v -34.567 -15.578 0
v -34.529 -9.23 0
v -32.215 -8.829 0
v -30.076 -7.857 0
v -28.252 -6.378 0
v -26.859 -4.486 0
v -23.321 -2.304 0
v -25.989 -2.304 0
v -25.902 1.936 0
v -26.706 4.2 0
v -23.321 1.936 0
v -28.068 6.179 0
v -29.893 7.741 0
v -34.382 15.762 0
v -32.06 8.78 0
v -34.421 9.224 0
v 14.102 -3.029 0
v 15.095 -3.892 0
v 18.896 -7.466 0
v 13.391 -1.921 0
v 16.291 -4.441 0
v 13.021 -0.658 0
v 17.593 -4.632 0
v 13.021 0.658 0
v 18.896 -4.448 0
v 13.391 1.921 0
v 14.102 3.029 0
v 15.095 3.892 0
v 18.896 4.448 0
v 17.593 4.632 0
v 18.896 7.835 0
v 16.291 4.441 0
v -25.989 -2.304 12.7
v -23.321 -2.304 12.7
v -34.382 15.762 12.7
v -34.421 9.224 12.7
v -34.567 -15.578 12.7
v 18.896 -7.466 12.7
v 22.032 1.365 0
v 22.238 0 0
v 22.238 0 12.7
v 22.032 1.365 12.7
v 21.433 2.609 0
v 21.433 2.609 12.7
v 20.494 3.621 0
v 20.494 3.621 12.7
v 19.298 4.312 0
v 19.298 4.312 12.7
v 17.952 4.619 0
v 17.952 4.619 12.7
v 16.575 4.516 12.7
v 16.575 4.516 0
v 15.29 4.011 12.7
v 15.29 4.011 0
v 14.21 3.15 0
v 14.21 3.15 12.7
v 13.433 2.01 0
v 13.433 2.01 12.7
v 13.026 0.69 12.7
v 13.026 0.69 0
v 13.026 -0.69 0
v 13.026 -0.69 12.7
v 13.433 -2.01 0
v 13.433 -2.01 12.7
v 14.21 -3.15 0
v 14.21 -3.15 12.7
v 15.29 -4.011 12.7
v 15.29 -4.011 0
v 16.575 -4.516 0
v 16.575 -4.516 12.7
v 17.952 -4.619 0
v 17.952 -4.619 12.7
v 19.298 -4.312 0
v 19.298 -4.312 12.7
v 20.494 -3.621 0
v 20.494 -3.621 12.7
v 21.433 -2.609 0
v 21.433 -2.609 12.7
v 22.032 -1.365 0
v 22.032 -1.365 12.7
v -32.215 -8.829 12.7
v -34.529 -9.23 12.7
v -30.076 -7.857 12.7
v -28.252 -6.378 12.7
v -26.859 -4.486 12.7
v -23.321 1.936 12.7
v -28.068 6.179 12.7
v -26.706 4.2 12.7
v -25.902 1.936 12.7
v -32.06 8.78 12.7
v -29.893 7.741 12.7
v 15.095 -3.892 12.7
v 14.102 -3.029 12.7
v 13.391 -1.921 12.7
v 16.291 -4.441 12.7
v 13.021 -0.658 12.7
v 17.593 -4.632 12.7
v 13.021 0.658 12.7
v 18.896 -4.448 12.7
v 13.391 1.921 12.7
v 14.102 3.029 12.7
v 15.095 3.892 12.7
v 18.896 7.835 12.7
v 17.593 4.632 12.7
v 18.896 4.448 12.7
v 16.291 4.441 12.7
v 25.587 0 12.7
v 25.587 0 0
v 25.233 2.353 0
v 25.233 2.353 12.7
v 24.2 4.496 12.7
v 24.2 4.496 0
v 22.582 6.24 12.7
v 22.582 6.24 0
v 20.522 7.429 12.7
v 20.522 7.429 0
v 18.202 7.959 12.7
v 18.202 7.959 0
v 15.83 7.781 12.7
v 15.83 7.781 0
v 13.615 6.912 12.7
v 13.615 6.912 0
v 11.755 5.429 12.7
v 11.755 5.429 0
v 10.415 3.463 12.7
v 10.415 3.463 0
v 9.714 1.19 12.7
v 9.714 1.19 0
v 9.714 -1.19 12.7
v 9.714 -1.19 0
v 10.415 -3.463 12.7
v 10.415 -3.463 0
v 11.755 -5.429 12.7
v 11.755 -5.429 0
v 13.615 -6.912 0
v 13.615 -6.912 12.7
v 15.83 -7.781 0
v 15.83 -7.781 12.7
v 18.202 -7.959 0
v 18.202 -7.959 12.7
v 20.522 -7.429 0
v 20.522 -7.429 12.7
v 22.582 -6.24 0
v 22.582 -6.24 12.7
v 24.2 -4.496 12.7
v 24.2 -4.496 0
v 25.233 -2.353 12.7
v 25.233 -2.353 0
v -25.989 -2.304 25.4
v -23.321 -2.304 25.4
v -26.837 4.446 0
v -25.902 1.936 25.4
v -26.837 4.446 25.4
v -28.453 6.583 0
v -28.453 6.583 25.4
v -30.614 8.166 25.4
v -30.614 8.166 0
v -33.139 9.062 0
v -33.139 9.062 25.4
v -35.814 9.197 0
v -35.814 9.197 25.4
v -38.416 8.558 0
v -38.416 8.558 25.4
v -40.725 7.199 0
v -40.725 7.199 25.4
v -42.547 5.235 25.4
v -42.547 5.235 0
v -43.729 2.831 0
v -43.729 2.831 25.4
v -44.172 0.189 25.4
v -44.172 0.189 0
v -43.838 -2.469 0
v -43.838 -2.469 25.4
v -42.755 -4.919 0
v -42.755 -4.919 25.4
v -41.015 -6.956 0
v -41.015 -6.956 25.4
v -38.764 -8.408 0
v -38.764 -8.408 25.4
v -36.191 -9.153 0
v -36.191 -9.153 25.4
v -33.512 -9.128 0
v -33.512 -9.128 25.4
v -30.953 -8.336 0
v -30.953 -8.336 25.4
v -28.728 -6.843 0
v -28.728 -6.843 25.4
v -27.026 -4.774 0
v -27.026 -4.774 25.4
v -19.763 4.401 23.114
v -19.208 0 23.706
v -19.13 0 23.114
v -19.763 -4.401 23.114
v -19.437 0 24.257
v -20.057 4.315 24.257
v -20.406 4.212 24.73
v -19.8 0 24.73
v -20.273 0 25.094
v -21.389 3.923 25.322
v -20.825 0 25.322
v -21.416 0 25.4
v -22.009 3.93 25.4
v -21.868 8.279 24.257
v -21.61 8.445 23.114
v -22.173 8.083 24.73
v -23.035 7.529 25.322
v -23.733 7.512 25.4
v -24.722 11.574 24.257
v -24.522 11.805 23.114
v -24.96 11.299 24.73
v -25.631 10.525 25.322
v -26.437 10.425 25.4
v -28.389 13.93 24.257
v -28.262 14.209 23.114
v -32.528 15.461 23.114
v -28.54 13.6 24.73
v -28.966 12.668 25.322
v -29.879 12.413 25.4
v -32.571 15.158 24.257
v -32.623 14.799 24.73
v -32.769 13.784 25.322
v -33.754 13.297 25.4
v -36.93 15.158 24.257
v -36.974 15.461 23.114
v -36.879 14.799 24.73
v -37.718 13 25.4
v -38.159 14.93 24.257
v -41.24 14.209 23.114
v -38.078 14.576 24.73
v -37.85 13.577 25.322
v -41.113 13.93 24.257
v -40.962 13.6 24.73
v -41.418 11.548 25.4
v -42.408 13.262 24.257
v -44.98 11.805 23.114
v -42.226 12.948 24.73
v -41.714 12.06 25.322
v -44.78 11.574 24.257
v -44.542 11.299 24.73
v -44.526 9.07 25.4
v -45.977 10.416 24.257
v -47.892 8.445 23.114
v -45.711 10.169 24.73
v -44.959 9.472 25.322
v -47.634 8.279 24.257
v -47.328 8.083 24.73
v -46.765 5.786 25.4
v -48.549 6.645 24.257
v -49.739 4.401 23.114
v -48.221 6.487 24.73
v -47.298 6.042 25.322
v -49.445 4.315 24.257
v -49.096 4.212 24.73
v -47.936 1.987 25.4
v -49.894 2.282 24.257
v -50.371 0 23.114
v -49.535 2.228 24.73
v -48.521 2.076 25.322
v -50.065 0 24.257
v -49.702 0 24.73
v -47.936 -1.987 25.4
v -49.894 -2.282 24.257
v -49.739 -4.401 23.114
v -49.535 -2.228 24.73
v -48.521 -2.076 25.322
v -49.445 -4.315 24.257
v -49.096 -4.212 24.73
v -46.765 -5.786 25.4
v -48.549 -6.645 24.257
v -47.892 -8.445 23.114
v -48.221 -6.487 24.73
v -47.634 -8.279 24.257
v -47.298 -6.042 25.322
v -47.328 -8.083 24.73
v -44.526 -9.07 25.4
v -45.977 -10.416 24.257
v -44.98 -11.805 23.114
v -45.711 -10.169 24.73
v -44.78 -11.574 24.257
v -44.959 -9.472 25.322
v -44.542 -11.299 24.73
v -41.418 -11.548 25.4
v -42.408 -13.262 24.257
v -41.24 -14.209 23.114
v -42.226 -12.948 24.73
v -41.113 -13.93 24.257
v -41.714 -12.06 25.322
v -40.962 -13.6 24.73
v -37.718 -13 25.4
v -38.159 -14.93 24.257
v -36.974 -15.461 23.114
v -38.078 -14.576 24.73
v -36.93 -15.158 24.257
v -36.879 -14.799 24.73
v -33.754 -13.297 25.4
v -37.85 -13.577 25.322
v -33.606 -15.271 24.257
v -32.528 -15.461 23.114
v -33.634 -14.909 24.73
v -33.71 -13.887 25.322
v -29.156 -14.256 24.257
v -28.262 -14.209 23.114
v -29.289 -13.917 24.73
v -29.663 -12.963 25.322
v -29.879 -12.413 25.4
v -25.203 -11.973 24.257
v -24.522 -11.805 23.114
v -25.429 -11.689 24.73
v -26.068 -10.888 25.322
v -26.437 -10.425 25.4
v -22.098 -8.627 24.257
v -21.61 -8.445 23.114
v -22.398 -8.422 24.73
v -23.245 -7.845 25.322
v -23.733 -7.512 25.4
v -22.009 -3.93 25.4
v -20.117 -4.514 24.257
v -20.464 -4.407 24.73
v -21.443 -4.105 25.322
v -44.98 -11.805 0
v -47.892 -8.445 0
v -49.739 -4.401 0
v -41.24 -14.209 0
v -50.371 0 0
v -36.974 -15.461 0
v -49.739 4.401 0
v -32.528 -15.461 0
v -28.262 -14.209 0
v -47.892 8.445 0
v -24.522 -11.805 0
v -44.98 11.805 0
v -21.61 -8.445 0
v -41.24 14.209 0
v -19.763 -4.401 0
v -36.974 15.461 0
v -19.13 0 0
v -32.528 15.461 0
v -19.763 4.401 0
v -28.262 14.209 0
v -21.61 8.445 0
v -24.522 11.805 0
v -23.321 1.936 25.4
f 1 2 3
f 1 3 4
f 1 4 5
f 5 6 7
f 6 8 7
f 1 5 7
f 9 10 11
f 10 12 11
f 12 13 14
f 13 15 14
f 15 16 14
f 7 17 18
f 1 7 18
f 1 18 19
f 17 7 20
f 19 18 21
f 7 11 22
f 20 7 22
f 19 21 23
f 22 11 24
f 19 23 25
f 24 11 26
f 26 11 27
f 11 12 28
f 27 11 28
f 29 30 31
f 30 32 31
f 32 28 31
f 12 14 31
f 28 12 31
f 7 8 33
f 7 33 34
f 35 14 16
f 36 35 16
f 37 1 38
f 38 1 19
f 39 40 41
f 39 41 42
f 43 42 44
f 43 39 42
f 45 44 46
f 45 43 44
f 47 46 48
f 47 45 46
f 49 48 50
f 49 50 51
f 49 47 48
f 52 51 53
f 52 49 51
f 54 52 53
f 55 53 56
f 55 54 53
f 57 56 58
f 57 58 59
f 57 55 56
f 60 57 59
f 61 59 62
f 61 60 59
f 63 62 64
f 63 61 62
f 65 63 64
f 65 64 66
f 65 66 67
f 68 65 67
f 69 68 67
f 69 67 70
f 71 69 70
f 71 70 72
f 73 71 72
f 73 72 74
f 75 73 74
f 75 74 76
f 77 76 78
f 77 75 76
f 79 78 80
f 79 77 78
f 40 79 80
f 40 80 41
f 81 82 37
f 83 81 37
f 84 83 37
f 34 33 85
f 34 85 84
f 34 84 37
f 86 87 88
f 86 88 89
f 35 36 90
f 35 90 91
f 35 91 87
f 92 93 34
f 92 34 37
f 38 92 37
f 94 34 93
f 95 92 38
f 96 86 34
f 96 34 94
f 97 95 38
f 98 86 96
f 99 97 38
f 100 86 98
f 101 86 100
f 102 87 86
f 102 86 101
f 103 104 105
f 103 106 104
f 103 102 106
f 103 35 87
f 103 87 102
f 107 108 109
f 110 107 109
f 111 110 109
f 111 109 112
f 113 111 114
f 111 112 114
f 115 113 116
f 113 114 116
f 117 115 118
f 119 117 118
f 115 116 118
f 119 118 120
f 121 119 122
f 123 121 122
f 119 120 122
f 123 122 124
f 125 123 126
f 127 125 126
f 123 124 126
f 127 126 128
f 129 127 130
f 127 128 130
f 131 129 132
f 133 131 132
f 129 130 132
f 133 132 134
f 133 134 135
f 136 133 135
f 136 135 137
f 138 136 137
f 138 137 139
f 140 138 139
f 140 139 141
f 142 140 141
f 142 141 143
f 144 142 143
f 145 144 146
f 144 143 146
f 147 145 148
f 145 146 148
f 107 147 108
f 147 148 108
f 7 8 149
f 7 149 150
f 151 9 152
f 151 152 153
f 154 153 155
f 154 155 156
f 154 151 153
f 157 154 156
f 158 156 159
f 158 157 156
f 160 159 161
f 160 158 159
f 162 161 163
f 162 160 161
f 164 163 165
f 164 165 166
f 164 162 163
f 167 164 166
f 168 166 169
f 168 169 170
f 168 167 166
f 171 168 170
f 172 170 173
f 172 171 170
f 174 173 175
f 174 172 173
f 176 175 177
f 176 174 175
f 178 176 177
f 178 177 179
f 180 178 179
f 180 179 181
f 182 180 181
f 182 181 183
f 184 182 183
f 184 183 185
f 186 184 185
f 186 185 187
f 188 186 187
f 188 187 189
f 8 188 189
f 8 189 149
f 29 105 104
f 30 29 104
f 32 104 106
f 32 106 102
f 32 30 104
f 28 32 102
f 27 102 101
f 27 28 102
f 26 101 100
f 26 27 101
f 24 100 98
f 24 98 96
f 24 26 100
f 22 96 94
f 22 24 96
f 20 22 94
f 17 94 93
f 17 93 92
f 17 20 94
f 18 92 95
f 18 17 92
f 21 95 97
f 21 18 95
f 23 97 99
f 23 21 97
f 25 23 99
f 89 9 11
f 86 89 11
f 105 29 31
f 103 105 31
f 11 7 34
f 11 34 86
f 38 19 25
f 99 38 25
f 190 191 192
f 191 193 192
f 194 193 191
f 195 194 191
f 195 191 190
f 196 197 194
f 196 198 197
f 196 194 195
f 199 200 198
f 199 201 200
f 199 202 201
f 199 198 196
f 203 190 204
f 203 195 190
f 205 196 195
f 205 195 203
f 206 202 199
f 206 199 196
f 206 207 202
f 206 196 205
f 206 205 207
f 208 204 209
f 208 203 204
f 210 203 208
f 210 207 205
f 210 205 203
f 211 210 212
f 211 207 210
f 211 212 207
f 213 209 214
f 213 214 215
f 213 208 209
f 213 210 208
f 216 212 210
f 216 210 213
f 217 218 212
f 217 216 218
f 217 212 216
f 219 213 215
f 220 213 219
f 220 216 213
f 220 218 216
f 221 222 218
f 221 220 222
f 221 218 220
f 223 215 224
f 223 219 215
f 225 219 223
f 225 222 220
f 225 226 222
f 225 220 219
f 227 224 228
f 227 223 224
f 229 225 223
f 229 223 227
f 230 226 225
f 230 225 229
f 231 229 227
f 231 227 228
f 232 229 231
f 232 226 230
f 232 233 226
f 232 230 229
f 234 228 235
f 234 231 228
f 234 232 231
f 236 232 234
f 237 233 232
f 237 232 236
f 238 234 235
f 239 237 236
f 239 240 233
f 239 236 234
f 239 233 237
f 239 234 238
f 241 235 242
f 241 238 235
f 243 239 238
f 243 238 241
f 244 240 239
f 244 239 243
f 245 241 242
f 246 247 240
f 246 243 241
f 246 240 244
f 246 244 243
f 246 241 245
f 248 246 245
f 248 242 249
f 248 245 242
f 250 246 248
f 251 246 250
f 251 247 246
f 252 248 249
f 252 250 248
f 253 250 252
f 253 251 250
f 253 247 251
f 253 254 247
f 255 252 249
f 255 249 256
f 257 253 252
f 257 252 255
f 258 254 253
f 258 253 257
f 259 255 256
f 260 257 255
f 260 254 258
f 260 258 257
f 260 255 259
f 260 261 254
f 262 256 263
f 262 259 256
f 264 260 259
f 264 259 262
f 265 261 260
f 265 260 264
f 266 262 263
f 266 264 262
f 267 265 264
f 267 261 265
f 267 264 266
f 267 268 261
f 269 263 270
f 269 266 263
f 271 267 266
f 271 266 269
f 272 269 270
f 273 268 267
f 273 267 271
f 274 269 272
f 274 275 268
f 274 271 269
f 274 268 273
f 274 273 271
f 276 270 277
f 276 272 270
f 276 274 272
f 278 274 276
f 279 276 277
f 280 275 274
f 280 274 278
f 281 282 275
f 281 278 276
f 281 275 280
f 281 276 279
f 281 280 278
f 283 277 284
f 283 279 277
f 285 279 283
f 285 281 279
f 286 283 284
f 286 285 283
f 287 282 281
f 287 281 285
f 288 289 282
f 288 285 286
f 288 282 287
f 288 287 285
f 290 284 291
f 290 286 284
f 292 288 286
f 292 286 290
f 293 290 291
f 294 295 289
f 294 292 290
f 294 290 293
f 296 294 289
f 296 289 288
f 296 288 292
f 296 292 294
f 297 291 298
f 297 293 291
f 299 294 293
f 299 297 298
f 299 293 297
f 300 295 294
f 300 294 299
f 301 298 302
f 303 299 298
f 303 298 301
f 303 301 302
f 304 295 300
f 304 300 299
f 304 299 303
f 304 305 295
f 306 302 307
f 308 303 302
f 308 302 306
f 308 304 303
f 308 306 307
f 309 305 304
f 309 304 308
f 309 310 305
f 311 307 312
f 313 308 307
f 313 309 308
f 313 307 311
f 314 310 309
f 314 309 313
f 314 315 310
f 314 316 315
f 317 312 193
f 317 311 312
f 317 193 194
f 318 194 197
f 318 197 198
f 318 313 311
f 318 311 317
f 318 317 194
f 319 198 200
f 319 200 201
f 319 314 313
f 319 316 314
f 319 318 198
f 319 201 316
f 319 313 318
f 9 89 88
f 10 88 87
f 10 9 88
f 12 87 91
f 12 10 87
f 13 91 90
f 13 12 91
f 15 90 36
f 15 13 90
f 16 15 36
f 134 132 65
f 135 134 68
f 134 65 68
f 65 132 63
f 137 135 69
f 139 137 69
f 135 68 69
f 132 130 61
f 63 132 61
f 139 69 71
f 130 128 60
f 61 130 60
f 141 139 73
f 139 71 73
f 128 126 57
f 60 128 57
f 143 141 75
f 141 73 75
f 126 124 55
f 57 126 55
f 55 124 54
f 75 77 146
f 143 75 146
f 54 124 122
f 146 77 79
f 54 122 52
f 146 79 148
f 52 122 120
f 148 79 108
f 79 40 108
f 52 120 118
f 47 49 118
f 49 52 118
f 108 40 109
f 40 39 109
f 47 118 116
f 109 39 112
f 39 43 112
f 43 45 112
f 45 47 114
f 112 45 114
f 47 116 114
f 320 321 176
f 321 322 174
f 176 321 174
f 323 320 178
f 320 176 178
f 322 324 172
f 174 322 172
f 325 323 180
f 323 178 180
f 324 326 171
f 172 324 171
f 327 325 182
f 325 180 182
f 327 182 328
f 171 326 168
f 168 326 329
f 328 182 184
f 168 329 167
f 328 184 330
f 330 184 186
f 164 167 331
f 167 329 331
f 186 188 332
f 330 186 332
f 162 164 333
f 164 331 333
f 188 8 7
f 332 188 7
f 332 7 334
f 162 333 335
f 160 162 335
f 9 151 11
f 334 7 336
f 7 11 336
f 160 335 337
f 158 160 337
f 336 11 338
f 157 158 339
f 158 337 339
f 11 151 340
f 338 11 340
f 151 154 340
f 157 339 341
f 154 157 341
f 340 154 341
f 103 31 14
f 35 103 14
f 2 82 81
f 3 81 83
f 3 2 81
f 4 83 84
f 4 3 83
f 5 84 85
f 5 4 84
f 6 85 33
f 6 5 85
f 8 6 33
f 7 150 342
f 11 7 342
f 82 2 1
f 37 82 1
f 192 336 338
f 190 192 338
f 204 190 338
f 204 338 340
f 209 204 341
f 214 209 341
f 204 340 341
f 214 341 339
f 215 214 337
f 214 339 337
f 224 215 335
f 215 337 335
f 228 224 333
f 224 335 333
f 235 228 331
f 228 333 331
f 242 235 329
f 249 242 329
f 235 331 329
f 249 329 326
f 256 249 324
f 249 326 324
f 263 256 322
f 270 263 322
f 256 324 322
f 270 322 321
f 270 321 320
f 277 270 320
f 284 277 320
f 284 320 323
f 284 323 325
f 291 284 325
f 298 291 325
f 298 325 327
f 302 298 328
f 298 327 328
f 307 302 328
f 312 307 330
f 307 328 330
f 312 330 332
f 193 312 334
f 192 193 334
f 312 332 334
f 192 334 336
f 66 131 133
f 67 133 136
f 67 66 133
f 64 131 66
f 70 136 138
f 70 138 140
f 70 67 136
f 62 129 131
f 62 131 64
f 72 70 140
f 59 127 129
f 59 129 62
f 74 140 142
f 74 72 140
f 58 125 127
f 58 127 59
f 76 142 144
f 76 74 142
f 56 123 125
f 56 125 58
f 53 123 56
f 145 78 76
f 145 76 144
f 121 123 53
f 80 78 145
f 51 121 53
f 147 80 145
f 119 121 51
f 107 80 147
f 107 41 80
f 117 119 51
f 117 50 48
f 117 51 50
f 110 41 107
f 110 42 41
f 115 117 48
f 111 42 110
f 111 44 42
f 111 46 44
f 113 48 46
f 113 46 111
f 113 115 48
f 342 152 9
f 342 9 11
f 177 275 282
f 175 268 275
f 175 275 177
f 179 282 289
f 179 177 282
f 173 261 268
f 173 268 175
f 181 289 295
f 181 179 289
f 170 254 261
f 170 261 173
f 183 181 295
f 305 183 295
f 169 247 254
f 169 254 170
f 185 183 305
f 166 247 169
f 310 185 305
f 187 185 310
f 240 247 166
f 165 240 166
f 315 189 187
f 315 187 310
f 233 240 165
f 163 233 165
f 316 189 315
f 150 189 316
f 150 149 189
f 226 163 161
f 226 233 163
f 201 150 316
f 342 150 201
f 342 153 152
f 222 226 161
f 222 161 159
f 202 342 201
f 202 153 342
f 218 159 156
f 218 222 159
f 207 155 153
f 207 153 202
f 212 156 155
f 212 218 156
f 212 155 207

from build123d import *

# Parameters (mm, degrees)
F0_R      = 15.620469
F2_DEPTH  = 25.4
F0_R_2    = 7.981201
F3_DEPTH  = 12.7
F4_DEPTH  = 12.7
F5_R      = 4.631858
F6_DEPTH  = 12.7
F7_R      = 9.238459
F8_DEPTH  = 25.4
F9_W      = 5.346291
F9_H      = 4.240161
F10_DEPTH = 25.4
F11_R     = 2.286


with BuildPart() as f2:
    # F0 (on Top) → F2 (new body)
    with BuildSketch(Plane.XY):
        with Locations((-34.750886, 0)):
            Circle(F0_R)
    extrude(amount=F2_DEPTH)


with BuildPart() as f3:
    # F0 (on Top) → F3 (new body)
    with BuildSketch(Plane.XY):
        with Locations((17.605888, 0)):
            Circle(F0_R_2)
    extrude(amount=F3_DEPTH)


with BuildPart() as f4:
    # F1 (on Top) → F4 (new body)
    with BuildSketch(Plane.XY):
        Polygon((18.896371, 7.835081), (-34.382179, 15.762338), (-34.566533, -15.577984), (18.896371, -7.466371), align=None)
    extrude(amount=F4_DEPTH)


with BuildPart() as f6_tool:
    # F5 (on Top) → F6 (new body)
    with BuildSketch(Plane.XY):
        with Locations((17.605888, 0)):
            Circle(F5_R)
    extrude(amount=F6_DEPTH)


with BuildPart() as f3_1:
    add(f3.part)

    # F6: cut by f6_tool
    add(f6_tool.part, mode=Mode.SUBTRACT)


with BuildPart() as f4_1:
    add(f4.part)

    # F6: cut by f6_tool
    add(f6_tool.part, mode=Mode.SUBTRACT)


with BuildPart() as f8_tool:
    # F7 (on Top) → F8 (new body)
    with BuildSketch(Plane.XY):
        with Locations((-34.935243, 0)):
            Circle(F7_R)
    extrude(amount=F8_DEPTH)


with BuildPart() as f2_1:
    add(f2.part)

    # F8: cut by f8_tool
    add(f8_tool.part, mode=Mode.SUBTRACT)


with BuildPart() as f4_2:
    add(f4_1.part)

    # F8: cut by f8_tool
    add(f8_tool.part, mode=Mode.SUBTRACT)


with BuildPart() as f10_tool:
    # F9 (on Top) → F10 (new body)
    with BuildSketch(Plane.XY):
        with Locations((-25.994032, -0.184354)):
            Rectangle(F9_W, F9_H)
    extrude(amount=F10_DEPTH)


with BuildPart() as f2_2:
    add(f2_1.part)

    # F10: cut by f10_tool
    add(f10_tool.part, mode=Mode.SUBTRACT)

    # F11
    f11_edges = [f2_2.edges().sort_by_distance(p)[0] for p in [
        (-50.371355, 0, 25.4),
    ]]
    fillet(f11_edges, radius=F11_R)


with BuildPart() as f4_3:
    add(f4_2.part)

    # F10: cut by f10_tool
    add(f10_tool.part, mode=Mode.SUBTRACT)


solid = Compound([f3_1.part, f2_2.part, f4_3.part])
